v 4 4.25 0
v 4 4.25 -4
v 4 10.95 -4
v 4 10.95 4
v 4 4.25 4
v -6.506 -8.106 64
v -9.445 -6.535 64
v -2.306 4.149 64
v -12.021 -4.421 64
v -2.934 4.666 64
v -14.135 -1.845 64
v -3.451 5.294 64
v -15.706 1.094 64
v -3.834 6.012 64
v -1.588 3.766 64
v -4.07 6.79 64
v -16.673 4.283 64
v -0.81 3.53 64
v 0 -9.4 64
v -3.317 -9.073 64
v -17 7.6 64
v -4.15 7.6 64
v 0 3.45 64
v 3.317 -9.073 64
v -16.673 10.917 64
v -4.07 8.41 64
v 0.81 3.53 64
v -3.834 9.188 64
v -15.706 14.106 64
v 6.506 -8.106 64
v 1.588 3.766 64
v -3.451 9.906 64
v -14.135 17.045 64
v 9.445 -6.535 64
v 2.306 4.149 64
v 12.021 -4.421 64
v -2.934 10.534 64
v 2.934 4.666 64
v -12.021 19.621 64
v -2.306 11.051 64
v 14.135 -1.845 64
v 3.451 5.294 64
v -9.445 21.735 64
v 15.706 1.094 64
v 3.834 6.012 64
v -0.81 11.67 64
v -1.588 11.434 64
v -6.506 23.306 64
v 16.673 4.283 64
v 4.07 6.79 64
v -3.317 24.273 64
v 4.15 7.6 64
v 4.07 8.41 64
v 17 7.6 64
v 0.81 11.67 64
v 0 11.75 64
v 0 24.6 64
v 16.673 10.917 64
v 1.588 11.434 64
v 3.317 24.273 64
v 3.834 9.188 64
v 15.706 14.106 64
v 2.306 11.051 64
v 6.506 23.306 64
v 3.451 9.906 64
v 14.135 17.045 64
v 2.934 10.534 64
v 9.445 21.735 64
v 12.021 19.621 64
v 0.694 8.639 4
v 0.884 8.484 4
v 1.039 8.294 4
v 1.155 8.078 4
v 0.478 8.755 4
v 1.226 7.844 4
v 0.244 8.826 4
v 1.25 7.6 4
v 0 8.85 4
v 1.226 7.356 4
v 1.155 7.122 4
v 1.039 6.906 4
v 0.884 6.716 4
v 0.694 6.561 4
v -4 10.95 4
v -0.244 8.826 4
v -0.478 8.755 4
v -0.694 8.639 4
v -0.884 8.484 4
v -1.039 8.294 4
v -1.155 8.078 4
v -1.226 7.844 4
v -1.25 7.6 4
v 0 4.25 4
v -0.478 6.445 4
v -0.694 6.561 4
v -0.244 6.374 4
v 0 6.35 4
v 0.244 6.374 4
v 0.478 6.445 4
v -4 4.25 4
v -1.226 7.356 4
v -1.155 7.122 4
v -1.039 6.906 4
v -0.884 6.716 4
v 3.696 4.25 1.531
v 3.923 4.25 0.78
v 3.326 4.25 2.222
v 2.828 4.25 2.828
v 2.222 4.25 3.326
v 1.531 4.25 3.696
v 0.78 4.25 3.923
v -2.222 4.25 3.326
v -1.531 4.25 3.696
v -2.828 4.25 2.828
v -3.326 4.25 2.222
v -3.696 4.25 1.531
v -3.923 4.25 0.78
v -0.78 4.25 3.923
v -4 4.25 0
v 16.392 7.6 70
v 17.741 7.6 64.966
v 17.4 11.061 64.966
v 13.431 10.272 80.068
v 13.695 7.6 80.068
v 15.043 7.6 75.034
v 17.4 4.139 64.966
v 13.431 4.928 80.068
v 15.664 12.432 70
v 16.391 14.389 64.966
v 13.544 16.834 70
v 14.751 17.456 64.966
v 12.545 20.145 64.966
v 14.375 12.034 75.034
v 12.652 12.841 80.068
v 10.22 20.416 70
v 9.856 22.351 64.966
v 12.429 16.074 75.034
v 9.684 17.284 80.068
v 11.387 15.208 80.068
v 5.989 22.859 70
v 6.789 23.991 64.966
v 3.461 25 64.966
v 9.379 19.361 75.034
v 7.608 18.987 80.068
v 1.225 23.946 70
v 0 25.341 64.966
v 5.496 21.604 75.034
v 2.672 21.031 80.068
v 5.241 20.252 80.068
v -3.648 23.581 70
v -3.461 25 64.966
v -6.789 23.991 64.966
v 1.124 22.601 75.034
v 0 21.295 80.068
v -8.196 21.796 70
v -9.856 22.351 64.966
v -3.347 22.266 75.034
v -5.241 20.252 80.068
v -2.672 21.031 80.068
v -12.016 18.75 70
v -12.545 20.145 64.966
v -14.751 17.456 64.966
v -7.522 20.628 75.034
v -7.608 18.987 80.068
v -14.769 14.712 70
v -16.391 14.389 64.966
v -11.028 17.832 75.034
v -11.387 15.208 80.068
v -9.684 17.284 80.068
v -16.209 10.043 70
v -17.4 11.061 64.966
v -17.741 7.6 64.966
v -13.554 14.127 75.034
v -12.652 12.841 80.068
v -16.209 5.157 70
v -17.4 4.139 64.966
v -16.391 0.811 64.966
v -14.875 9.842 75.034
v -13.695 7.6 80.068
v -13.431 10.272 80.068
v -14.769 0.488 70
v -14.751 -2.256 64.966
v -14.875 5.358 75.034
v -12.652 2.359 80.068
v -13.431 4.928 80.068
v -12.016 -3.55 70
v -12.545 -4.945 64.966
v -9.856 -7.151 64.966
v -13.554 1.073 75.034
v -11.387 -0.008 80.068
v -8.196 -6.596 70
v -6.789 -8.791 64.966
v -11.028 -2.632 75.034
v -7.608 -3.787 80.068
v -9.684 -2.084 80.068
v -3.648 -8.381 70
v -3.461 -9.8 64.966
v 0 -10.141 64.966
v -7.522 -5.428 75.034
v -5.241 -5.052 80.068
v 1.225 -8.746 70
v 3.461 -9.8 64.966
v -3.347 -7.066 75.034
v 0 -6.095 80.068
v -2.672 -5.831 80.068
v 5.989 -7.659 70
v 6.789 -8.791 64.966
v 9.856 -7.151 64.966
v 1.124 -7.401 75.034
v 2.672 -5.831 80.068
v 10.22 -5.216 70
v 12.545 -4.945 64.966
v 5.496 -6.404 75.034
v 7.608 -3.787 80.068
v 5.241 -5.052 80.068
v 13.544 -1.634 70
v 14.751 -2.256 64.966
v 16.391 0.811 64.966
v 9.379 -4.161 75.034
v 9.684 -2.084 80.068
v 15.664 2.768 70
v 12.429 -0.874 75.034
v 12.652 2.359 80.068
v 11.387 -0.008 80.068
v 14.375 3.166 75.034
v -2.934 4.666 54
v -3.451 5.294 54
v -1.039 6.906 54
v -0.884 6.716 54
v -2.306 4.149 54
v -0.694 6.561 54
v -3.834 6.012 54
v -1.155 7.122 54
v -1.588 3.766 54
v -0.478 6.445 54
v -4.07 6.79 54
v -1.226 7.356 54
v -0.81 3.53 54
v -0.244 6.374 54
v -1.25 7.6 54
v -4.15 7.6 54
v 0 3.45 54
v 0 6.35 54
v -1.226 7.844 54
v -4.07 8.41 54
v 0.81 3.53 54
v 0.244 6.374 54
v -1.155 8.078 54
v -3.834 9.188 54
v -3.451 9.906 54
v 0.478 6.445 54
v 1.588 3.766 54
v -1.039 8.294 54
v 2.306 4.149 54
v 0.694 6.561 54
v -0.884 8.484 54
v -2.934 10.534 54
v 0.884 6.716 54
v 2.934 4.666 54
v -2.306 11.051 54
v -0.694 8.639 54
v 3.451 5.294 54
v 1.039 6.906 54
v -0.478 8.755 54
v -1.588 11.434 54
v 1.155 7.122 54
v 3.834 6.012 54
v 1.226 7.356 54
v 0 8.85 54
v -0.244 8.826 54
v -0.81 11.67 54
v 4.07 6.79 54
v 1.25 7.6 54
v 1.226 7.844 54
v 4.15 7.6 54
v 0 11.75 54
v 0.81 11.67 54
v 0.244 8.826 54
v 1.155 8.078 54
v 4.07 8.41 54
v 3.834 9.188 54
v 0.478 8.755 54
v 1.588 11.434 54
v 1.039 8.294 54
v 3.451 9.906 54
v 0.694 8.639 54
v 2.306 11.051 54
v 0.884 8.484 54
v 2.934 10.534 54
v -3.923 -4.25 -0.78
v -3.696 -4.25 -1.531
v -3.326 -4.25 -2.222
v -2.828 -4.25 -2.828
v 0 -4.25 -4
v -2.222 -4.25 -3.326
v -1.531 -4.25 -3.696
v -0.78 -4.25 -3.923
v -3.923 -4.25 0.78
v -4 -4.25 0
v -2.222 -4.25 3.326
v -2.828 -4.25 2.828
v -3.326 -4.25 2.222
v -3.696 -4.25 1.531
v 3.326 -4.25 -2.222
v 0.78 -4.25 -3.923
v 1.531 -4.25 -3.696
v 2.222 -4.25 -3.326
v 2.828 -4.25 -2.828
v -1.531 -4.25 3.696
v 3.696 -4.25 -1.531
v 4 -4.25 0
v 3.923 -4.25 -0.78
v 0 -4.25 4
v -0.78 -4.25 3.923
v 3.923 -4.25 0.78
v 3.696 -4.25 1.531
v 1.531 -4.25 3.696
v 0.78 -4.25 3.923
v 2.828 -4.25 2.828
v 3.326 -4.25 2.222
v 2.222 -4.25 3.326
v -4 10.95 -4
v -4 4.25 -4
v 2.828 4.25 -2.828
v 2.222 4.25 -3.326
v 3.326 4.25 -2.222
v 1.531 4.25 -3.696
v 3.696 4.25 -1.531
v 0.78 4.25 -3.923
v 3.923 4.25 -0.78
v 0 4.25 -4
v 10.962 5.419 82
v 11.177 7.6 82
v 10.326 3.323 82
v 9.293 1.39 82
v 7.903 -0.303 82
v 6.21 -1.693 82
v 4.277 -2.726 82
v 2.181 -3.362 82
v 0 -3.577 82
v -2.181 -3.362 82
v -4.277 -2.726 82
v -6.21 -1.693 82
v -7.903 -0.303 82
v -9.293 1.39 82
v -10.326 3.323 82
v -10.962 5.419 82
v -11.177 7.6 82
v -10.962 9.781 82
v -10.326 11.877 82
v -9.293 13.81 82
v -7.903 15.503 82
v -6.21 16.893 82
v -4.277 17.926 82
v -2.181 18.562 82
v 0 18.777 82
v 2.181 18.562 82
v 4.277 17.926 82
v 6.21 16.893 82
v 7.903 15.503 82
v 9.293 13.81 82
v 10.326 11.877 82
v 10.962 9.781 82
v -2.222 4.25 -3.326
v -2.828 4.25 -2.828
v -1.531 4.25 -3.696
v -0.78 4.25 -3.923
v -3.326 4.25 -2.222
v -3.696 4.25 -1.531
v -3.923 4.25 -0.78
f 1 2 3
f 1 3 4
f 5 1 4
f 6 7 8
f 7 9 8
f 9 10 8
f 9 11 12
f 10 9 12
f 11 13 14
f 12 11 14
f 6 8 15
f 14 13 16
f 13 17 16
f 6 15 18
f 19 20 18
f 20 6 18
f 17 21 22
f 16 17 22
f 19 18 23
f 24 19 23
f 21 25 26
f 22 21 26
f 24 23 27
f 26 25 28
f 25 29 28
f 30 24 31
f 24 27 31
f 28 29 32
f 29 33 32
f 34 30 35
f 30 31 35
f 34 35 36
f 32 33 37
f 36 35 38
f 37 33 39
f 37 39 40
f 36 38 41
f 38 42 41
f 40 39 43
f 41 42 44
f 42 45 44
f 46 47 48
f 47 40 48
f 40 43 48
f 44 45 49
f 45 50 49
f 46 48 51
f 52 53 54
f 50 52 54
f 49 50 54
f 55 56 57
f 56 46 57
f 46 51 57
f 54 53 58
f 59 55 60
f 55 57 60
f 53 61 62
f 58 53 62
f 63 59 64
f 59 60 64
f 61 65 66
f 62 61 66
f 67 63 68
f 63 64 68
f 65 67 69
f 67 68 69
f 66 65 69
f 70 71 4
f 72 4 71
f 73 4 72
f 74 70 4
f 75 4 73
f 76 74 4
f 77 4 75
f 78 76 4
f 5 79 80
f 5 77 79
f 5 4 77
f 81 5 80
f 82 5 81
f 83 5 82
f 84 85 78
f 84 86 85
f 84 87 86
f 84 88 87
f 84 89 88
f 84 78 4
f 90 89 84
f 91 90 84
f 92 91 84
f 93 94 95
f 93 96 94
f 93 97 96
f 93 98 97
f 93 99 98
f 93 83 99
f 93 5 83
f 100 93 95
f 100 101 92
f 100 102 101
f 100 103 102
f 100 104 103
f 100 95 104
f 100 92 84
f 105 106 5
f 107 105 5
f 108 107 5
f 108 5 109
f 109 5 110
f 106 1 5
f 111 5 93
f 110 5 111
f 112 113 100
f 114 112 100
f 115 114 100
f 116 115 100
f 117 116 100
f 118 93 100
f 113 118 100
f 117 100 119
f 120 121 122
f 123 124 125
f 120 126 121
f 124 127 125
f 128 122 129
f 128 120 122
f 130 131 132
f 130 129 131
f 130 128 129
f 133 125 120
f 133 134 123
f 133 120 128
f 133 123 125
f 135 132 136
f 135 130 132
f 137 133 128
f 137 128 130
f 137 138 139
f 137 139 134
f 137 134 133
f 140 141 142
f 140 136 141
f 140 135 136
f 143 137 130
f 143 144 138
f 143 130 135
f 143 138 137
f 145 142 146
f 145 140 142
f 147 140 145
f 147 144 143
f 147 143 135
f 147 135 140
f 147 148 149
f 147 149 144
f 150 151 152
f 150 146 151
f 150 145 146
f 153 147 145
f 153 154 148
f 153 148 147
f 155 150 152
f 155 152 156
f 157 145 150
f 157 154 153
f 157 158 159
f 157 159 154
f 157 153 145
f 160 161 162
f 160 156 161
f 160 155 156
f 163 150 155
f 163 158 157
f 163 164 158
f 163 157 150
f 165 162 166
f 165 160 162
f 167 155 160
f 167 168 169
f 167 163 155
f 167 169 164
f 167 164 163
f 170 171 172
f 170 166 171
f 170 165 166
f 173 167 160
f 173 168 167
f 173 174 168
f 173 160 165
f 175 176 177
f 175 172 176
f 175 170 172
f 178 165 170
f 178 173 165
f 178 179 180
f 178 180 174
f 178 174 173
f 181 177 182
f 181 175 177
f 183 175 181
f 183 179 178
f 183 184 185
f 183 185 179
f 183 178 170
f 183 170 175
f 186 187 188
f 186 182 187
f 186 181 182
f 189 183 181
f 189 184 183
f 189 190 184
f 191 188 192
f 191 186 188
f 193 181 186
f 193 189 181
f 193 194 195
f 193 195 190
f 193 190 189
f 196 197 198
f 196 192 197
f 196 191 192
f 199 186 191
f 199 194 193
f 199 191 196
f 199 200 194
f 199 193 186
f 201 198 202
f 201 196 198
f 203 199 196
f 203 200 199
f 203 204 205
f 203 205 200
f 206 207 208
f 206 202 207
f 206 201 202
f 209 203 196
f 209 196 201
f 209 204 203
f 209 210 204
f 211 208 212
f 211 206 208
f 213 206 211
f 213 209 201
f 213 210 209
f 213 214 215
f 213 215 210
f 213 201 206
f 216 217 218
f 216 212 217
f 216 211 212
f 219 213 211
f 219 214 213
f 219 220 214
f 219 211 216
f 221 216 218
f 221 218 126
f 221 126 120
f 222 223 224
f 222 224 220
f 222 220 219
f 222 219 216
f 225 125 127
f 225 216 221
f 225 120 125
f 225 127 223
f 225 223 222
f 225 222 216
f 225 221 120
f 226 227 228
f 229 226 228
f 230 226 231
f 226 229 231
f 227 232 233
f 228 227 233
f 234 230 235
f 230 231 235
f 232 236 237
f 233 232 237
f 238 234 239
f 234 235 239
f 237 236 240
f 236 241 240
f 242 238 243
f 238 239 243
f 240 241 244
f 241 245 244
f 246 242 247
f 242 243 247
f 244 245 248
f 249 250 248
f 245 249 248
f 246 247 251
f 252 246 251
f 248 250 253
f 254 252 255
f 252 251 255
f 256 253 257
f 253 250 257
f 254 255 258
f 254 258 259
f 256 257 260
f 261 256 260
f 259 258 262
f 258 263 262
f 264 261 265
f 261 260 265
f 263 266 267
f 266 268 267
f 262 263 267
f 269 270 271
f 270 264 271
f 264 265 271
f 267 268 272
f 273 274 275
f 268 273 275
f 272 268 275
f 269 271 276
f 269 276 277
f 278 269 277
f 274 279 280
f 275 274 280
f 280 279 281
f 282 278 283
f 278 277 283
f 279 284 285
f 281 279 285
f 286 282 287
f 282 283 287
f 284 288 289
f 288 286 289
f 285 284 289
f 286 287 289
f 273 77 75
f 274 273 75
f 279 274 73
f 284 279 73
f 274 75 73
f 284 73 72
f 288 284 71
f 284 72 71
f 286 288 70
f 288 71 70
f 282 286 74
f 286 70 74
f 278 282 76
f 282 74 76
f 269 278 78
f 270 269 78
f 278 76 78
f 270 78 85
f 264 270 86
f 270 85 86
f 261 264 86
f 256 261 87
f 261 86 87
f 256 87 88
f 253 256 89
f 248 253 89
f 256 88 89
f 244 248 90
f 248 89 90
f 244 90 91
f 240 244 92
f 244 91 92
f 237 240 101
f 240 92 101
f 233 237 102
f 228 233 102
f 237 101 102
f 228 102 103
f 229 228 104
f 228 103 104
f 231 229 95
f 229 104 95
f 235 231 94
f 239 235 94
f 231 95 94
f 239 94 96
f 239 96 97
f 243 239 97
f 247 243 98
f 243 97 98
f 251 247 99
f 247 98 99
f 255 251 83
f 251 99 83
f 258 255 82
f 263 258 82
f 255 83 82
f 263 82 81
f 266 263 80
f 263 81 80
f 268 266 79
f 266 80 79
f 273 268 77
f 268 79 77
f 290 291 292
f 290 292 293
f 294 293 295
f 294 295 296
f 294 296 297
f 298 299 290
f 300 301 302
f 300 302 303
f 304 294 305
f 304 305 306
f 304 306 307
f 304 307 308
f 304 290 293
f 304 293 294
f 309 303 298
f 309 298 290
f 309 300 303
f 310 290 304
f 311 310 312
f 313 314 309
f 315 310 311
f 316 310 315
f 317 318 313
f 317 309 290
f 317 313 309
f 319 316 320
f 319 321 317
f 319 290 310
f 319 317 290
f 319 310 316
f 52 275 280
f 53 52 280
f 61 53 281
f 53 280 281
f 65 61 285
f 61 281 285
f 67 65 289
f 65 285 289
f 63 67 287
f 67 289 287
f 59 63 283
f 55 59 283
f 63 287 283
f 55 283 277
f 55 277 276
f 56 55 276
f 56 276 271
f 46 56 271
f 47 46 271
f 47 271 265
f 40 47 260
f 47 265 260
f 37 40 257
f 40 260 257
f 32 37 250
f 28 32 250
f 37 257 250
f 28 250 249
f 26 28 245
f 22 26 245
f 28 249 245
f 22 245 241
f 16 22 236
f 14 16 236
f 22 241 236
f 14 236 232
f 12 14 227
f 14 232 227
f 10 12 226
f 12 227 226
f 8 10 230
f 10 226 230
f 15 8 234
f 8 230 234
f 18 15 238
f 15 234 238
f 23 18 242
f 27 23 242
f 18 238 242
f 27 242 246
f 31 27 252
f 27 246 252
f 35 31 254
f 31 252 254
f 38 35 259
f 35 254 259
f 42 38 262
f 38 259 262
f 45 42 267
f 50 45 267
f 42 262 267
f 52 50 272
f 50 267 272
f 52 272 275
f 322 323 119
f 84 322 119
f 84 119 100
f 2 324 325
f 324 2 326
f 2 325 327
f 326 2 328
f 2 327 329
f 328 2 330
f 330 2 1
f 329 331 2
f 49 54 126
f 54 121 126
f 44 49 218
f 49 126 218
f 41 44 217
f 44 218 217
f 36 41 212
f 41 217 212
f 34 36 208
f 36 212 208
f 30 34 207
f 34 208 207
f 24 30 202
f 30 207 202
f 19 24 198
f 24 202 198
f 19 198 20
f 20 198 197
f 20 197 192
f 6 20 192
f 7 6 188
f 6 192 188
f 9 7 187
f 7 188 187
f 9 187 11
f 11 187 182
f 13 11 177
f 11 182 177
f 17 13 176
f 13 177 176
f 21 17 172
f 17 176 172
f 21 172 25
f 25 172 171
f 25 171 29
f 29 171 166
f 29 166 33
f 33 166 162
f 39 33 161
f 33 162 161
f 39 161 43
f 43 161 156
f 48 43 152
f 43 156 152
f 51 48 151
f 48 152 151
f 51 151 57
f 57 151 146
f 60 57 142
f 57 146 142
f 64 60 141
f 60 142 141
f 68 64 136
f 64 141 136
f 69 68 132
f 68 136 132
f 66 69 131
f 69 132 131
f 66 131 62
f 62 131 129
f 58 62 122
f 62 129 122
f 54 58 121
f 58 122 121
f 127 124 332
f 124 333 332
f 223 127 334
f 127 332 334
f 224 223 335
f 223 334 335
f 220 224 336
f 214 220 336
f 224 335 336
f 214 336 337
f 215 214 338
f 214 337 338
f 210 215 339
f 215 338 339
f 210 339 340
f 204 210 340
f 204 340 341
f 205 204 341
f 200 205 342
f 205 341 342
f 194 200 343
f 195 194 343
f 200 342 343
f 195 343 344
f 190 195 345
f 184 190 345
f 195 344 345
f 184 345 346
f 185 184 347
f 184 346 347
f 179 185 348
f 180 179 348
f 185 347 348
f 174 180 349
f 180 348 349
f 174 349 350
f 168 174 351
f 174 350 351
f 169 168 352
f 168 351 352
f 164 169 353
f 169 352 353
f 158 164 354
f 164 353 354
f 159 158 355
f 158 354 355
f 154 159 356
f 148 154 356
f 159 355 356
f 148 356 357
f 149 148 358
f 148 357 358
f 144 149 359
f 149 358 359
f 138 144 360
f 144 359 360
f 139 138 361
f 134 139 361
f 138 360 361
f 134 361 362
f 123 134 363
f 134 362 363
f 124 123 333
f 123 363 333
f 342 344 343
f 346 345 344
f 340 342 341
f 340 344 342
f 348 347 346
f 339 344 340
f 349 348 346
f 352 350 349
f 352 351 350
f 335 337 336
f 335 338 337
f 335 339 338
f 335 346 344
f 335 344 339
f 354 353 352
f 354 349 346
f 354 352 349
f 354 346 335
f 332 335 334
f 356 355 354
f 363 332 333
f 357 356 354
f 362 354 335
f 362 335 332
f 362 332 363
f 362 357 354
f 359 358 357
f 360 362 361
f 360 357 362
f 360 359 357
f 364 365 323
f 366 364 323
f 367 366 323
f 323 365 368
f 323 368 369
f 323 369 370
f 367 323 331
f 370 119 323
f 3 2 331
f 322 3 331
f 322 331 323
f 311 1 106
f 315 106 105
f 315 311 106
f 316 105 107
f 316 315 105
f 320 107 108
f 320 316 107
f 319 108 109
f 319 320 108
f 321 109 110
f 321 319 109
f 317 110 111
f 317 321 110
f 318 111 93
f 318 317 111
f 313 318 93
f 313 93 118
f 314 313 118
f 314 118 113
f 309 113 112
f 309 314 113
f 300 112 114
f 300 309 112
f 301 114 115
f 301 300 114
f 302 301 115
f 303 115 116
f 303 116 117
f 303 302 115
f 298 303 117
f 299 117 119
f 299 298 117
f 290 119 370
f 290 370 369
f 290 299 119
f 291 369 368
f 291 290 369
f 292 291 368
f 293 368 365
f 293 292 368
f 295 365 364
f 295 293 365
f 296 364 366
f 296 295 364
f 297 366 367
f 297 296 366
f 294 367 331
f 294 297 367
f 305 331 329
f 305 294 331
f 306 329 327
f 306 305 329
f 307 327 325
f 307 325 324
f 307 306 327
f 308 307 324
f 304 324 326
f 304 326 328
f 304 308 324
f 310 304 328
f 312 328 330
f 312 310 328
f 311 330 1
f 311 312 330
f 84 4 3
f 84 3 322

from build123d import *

# Parameters (mm, degrees)
F0_R     = 4
F1_DEPTH = 4.25
F2_W     = 8
F2_H     = 8
F3_DEPTH = 6.7
F4_R     = 1.25
F5_DEPTH = 50
F6_R     = 4.15
F7_DEPTH = 10
F8_R     = 18
F8_R_2   = 4.15
F9_DEPTH = 18
F9_TAPER = 15


# Not quite as in the source:
# - a fillet or chamfer that OpenCascade refuses, or shapes differently, is made with other operations: its cross-section is extruded or revolved along the edge and cut away or added


with BuildPart() as f1:
    # F0 (on Front) → F1 (new body, symmetric)
    with BuildSketch(Plane.XZ):
        Circle(F0_R)
    extrude(amount=F1_DEPTH, both=True)

    # F2 (on face) → F3 (join)
    with BuildSketch(Plane(origin=(0, 4.25, 0), x_dir=(-1, 0, 0), z_dir=(0, 1, 0))):
        Rectangle(F2_W, F2_H)
    extrude(amount=F3_DEPTH)

    # F4 (on face) → F5 (join)
    with BuildSketch(Plane.XY.offset(4)):
        with Locations((0, 7.6)):
            Circle(F4_R)
    extrude(amount=F5_DEPTH)

    # F6 (on face) → F7 (join)
    with BuildSketch(Plane.XY.offset(54)):
        with Locations((0, 7.6)):
            Circle(F6_R)
    extrude(amount=F7_DEPTH)

    # F8 (on face) → F9 (join)
    with BuildSketch(Plane.XY.offset(64)):
        with Locations((0, 7.6)):
            Circle(F8_R)
        with Locations((0, 7.6)):
            Circle(F8_R_2, mode=Mode.SUBTRACT)
        with Locations((0, 7.6)):
            Circle(F8_R_2)
    extrude(amount=F9_DEPTH, taper=F9_TAPER)

    # F10: chamfer of 1 on 1 edges, made by hand

    # F10_s1 → F10_t2 (revolve, cut)
    with BuildSketch(Plane.XZ.offset(-7.6)):
        Polygon((17, 64), (17.7411809549, 64.9659258263), (18, 64), align=None)
    revolve(axis=Axis((0, 7.6, 64), (0, 0, -1)), mode=Mode.SUBTRACT)

    # F11: chamfer of 2 on 1 edges, made by hand

    # F11_s1 → F11_t2 (revolve, cut)
    with BuildSketch(Plane.XZ.offset(-7.6)):
        Polygon((13.6945526264, 80.0681483474), (11.1769145362, 82), (13.1769145362, 82), align=None)
    revolve(axis=Axis((0, 7.6, 82), (0, 0, -1)), mode=Mode.SUBTRACT)


solid = f1.part
